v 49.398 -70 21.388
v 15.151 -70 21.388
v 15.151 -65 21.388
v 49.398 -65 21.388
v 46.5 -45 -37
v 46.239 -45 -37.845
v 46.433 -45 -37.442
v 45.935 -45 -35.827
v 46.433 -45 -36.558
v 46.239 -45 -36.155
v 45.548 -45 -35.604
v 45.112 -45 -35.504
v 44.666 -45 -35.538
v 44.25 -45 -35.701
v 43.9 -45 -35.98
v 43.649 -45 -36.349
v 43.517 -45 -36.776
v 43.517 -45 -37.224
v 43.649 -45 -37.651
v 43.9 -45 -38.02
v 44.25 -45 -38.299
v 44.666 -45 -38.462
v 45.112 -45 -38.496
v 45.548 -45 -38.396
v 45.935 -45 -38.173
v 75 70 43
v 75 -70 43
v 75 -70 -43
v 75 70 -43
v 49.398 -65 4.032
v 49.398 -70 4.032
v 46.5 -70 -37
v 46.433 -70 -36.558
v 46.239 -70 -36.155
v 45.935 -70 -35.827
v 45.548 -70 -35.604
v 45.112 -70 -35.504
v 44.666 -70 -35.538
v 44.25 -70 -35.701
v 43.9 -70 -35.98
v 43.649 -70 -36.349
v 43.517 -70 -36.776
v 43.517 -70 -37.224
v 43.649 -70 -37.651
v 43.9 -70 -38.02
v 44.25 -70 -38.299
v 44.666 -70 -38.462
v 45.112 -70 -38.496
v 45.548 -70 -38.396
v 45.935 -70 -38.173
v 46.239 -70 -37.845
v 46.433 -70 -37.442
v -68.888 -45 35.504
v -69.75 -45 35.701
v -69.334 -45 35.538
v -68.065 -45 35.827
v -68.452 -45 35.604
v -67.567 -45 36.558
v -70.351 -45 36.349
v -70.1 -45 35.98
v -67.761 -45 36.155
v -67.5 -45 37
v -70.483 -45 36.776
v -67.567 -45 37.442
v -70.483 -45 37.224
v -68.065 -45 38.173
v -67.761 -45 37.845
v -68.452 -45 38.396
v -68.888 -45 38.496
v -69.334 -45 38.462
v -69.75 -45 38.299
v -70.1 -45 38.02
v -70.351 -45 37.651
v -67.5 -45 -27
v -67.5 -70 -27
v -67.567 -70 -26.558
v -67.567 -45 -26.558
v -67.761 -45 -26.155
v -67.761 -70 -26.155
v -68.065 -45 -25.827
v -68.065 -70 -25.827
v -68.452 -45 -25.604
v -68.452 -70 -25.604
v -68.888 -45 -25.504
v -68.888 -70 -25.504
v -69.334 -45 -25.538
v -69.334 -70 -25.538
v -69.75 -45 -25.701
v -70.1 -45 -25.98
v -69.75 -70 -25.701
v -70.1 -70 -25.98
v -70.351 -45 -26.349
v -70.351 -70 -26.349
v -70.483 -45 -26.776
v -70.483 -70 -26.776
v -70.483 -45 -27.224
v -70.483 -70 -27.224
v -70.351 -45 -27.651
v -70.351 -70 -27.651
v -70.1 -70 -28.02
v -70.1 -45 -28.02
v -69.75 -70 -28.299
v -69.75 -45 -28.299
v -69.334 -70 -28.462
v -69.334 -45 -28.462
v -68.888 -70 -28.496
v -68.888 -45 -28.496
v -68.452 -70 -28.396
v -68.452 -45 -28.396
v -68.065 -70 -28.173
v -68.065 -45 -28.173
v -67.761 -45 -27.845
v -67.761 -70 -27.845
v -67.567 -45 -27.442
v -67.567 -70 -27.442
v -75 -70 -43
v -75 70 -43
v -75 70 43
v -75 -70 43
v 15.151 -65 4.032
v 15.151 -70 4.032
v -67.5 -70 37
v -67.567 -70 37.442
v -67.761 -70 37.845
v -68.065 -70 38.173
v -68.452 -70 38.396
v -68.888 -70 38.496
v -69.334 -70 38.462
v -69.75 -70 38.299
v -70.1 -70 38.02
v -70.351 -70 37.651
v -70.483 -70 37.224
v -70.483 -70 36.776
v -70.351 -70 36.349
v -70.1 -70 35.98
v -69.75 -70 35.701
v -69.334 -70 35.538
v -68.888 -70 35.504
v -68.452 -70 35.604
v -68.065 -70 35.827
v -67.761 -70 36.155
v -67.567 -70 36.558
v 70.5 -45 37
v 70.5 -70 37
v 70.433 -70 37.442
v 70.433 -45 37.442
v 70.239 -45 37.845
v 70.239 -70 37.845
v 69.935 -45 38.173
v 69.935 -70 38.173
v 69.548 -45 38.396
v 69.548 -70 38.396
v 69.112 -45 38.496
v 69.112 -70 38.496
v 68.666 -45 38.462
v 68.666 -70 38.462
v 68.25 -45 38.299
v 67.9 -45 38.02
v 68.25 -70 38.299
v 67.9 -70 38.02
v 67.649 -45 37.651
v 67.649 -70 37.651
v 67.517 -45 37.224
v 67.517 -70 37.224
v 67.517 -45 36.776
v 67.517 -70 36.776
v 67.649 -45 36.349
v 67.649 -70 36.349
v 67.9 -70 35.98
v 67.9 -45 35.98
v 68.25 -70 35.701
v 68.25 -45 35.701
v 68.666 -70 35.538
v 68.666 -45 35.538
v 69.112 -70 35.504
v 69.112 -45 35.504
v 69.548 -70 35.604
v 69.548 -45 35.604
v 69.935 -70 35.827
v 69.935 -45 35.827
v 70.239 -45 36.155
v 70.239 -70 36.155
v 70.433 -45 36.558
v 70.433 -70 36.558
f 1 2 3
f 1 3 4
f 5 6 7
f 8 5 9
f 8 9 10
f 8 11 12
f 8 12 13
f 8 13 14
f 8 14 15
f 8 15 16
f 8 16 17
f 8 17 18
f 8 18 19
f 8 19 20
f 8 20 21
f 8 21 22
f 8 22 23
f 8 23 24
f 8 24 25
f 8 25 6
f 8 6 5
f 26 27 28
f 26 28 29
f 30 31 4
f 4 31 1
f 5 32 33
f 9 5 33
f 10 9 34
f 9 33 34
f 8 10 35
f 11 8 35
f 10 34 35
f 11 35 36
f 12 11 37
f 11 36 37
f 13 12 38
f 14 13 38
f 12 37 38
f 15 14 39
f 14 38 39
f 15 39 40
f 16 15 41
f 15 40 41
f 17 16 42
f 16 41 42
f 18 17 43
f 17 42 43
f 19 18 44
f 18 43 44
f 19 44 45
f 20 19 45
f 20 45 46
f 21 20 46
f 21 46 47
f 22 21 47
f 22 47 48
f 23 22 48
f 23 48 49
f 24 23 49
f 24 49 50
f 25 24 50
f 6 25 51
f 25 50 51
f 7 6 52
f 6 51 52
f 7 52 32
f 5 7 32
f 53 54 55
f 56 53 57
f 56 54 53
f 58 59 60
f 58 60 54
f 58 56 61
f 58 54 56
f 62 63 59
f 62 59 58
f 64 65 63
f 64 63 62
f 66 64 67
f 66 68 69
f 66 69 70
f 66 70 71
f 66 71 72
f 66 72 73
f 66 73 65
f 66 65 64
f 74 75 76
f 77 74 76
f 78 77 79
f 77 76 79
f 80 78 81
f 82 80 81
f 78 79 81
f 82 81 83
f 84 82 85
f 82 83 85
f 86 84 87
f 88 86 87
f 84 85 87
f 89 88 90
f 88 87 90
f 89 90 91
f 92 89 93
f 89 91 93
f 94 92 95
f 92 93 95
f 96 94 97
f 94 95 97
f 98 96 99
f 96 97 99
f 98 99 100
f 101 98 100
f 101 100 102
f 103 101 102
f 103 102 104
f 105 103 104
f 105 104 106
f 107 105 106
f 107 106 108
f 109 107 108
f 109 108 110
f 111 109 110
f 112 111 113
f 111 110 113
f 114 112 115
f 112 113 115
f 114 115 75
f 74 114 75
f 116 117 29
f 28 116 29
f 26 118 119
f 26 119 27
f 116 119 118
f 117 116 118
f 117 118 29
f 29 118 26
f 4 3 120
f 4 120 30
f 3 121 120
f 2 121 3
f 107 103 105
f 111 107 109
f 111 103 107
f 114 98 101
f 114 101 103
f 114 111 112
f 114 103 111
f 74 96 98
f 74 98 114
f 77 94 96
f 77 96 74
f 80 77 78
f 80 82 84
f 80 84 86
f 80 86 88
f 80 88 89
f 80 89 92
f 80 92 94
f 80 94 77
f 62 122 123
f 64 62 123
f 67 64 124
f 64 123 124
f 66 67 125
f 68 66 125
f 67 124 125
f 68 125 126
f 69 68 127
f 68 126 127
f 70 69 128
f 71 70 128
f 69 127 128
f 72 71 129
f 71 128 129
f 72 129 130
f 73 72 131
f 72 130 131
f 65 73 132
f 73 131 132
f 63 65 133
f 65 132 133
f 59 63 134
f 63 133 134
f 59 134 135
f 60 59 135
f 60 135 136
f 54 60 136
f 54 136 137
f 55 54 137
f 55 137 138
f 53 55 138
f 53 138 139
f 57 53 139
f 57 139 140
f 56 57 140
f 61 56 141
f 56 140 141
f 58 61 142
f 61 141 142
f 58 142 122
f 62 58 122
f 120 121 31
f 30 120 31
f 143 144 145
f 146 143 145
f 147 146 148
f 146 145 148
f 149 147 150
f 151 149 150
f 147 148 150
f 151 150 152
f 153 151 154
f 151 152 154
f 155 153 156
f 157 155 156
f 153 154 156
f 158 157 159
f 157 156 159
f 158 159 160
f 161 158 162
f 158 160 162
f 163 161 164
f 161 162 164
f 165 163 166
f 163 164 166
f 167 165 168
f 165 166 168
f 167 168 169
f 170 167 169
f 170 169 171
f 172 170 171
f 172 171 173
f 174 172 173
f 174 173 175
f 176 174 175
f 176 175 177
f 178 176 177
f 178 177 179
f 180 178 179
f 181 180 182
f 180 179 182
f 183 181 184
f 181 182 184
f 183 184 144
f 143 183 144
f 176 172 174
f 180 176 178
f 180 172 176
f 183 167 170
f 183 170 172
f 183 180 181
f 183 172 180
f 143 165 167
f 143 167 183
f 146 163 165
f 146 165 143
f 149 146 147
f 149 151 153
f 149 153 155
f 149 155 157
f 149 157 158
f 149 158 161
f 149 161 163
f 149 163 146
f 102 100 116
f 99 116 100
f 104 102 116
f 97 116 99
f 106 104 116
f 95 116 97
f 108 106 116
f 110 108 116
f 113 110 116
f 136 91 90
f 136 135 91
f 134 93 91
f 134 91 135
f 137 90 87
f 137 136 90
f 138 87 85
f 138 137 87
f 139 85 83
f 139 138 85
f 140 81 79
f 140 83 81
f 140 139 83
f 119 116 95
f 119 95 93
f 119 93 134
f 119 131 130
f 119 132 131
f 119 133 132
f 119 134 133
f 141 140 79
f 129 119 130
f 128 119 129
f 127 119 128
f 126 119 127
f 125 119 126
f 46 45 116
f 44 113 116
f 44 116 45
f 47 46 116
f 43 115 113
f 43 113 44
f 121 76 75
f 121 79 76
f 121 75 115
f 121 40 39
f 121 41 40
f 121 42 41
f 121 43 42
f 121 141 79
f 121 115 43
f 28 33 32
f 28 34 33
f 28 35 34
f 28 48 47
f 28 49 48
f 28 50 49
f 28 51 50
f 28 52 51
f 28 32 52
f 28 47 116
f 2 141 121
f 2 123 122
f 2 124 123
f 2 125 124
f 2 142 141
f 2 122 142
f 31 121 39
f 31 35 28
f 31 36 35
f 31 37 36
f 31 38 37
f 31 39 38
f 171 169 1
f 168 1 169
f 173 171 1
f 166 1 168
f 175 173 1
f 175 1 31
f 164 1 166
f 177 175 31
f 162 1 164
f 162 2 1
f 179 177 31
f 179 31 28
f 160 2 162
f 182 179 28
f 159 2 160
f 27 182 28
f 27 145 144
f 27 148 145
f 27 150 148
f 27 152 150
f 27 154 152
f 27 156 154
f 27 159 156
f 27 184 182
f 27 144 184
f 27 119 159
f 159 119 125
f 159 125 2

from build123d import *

# Parameters (mm, degrees)
F0_W     = 150
F0_H     = 140
F1_DEPTH = 43
F2_R     = 1.5
F3_DEPTH = 25
F4_W     = 34.246223
F4_H     = 17.356102
F5_DEPTH = 5


with BuildPart() as f1:
    # F0 (on Top) → F1 (new body, symmetric)
    with BuildSketch(Plane.XY):
        Rectangle(F0_W, F0_H)
    extrude(amount=F1_DEPTH, both=True)

    # F2 (on face) → F3 (cut)
    with BuildSketch(Plane.XZ.offset(70)):
        with Locations((-69, 37)):
            Circle(F2_R)
        with Locations((69, 37)):
            Circle(F2_R)
        with Locations((45, -37)):
            Circle(F2_R)
        with Locations((-69, -27)):
            Circle(F2_R)
    extrude(amount=-F3_DEPTH, mode=Mode.SUBTRACT)

    # F4 (on face) → F5 (cut)
    with BuildSketch(Plane.XZ.offset(70)):
        with Locations((32.274584, 12.710388)):
            Rectangle(F4_W, F4_H)
    extrude(amount=-F5_DEPTH, mode=Mode.SUBTRACT)


solid = f1.part
